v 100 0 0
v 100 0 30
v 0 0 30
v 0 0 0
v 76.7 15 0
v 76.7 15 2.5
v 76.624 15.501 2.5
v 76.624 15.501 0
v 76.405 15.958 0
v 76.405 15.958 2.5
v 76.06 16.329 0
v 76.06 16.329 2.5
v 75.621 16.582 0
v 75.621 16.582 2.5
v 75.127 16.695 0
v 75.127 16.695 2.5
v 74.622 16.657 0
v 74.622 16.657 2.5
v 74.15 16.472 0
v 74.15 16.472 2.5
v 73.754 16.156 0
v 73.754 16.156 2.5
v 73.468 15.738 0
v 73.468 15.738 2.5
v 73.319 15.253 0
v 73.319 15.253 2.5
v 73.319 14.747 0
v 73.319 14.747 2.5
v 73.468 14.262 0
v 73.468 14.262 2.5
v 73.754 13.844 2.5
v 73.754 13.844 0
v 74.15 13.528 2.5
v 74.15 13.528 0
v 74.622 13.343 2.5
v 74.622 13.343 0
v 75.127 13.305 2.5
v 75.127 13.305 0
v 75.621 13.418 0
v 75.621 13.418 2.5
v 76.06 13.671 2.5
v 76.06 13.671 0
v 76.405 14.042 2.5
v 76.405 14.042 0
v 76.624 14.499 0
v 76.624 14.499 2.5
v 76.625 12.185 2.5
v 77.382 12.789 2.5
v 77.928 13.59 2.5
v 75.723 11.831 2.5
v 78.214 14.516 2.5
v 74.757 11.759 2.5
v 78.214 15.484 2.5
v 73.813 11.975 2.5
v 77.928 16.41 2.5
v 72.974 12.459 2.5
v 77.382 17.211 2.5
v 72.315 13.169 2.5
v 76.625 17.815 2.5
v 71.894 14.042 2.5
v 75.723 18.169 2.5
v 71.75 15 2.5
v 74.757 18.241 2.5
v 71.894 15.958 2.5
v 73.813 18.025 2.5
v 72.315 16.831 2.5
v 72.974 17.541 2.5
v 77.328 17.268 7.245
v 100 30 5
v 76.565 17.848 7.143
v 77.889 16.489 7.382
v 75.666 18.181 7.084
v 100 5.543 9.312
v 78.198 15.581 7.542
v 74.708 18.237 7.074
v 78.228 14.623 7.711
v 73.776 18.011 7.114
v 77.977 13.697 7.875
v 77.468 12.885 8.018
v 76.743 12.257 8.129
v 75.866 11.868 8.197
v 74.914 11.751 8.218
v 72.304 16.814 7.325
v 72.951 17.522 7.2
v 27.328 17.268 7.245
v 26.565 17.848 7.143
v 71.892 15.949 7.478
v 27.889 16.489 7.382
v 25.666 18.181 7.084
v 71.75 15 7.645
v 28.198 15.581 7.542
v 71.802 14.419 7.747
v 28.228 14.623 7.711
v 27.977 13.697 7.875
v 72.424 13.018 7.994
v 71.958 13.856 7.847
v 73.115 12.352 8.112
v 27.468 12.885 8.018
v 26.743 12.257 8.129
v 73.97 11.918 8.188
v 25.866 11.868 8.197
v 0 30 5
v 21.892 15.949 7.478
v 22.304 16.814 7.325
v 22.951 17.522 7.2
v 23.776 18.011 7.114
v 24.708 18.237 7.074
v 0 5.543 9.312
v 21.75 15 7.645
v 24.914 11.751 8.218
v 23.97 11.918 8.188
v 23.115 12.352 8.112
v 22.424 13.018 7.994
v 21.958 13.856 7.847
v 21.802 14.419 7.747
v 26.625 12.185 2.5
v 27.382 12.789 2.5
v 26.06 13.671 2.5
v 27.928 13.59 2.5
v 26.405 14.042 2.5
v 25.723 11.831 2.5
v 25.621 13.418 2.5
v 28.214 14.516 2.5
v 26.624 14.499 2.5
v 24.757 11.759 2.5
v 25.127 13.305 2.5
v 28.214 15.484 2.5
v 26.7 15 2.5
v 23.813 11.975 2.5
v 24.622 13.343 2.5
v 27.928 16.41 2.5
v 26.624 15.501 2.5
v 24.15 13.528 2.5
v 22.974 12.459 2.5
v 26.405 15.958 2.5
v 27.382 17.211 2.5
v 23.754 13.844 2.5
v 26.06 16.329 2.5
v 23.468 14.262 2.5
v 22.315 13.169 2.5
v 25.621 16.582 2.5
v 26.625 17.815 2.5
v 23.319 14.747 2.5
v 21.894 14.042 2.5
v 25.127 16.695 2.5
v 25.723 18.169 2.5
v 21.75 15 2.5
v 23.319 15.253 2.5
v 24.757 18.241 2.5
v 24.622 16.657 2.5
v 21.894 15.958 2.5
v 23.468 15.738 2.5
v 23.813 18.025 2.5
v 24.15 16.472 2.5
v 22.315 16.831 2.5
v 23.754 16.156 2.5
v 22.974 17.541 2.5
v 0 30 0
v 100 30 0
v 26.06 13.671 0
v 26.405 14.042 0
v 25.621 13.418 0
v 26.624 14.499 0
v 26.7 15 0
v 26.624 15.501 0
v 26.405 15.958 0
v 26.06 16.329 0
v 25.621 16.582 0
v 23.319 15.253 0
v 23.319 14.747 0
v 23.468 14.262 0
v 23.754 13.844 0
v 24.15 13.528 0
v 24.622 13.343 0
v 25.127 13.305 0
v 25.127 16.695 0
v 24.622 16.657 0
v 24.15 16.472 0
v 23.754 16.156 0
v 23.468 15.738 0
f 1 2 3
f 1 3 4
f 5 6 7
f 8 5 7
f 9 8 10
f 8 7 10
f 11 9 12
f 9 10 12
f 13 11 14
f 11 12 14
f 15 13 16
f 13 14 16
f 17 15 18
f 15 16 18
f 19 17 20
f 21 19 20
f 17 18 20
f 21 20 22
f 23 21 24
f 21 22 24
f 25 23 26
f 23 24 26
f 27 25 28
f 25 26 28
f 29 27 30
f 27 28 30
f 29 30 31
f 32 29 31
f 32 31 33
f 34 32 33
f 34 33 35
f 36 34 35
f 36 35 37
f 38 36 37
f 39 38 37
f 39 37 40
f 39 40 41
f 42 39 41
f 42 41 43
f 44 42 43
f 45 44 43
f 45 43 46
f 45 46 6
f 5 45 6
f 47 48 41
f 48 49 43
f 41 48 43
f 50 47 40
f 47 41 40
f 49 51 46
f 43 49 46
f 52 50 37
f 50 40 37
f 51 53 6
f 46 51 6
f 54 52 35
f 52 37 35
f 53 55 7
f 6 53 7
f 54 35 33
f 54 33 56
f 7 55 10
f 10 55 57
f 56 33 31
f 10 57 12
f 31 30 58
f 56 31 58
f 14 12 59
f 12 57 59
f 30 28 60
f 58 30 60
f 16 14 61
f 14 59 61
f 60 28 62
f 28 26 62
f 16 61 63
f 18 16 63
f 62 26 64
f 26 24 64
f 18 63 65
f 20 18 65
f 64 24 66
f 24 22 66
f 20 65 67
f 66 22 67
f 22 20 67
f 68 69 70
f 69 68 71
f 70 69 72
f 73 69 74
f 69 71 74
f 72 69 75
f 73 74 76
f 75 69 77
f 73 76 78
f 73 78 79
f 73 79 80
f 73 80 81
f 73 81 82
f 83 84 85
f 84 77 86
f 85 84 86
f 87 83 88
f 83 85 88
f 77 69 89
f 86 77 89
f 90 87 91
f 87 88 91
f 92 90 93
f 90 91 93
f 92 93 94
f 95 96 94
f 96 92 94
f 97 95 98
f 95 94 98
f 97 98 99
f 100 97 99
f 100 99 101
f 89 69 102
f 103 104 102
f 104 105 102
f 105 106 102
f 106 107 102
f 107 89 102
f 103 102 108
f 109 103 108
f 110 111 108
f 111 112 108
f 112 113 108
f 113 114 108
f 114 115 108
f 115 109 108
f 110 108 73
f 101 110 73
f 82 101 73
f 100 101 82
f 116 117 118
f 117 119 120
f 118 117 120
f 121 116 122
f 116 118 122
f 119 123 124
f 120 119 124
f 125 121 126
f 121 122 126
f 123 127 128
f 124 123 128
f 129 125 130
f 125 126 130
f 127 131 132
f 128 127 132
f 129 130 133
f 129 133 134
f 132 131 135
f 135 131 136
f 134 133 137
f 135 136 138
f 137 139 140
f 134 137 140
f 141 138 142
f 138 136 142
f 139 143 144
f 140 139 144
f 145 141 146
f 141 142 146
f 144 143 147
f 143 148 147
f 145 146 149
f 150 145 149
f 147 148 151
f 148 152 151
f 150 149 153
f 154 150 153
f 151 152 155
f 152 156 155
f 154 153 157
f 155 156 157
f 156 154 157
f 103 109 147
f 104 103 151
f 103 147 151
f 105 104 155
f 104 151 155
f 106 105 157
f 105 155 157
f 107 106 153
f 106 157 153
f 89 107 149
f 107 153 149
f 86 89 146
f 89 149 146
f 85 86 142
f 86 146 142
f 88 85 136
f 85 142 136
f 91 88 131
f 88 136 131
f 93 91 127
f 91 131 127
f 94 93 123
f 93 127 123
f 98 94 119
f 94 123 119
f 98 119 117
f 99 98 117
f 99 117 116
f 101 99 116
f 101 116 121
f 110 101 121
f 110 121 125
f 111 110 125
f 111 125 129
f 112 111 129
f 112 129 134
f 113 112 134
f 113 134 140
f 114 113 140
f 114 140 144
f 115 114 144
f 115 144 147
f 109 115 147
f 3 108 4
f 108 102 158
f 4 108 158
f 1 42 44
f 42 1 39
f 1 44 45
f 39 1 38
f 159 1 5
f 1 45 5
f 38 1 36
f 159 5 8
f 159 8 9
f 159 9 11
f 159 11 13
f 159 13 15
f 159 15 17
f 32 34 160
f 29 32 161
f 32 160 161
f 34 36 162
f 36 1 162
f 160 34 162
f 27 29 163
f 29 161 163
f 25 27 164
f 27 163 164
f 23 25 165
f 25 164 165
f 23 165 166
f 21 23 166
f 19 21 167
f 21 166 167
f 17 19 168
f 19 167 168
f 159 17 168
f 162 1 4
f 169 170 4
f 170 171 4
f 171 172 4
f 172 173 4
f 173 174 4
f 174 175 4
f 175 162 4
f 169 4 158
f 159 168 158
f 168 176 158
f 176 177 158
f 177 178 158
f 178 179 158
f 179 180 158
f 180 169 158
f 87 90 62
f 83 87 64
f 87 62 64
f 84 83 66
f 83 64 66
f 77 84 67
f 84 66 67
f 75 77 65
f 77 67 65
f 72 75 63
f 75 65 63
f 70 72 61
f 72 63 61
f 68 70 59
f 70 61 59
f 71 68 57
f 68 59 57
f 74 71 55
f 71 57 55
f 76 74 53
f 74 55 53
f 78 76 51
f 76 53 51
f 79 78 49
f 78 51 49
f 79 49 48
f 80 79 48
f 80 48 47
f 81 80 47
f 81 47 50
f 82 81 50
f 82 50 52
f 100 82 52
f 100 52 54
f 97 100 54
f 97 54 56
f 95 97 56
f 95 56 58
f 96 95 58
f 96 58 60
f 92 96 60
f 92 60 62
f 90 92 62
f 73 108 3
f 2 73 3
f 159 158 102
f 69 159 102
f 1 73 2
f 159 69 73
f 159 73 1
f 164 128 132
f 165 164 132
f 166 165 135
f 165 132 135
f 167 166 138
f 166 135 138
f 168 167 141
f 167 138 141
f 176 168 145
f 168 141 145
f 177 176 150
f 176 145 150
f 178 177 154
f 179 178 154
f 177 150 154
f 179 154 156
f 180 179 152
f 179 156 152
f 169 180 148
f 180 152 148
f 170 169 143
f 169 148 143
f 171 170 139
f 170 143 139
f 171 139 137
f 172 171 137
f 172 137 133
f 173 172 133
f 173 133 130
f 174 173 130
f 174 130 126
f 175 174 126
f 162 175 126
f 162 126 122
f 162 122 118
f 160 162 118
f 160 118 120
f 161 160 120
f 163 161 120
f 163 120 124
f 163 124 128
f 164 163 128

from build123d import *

# Parameters (mm, degrees)
BOSS_EXTRUDE1_DEPTH  = 100
M3_CLEARANCE_HOLE1_D = 3.4
SKETCH4_R            = 3.25
CUT_EXTRUDE1_DEPTH   = 108.964114408


with BuildPart() as part:
    # Sketch1 → Boss-Extrude1 (new body)
    with BuildSketch(Plane(origin=(0, 0, 0), x_dir=(0, 0, -1), z_dir=(1, 0, 0))):
        Polygon((0, 0), (0, 30), (-5, 30), (-9.312388631, 5.54322876), (-30, 0), align=None)
    extrude(amount=BOSS_EXTRUDE1_DEPTH)

    # M3 Clearance Hole1 (through all)
    with Locations(Plane(origin=(0, 0, 0), x_dir=(-1, 0, 0), z_dir=(0, 0, -1))):
        with Locations((-25, 15), (-75, 15)):
            Hole(M3_CLEARANCE_HOLE1_D / 2)

    # Sketch4 → Cut-Extrude1 (cut, through all)
    with BuildSketch(Plane(origin=(0, 0, 2.5), x_dir=(-1, 0, 0), z_dir=(0, 0, -1))):
        with Locations((-75, 15)):
            Circle(SKETCH4_R)
        with Locations((-25, 15)):
            Circle(SKETCH4_R)
    extrude(amount=-CUT_EXTRUDE1_DEPTH, mode=Mode.SUBTRACT)


solid = part.part
